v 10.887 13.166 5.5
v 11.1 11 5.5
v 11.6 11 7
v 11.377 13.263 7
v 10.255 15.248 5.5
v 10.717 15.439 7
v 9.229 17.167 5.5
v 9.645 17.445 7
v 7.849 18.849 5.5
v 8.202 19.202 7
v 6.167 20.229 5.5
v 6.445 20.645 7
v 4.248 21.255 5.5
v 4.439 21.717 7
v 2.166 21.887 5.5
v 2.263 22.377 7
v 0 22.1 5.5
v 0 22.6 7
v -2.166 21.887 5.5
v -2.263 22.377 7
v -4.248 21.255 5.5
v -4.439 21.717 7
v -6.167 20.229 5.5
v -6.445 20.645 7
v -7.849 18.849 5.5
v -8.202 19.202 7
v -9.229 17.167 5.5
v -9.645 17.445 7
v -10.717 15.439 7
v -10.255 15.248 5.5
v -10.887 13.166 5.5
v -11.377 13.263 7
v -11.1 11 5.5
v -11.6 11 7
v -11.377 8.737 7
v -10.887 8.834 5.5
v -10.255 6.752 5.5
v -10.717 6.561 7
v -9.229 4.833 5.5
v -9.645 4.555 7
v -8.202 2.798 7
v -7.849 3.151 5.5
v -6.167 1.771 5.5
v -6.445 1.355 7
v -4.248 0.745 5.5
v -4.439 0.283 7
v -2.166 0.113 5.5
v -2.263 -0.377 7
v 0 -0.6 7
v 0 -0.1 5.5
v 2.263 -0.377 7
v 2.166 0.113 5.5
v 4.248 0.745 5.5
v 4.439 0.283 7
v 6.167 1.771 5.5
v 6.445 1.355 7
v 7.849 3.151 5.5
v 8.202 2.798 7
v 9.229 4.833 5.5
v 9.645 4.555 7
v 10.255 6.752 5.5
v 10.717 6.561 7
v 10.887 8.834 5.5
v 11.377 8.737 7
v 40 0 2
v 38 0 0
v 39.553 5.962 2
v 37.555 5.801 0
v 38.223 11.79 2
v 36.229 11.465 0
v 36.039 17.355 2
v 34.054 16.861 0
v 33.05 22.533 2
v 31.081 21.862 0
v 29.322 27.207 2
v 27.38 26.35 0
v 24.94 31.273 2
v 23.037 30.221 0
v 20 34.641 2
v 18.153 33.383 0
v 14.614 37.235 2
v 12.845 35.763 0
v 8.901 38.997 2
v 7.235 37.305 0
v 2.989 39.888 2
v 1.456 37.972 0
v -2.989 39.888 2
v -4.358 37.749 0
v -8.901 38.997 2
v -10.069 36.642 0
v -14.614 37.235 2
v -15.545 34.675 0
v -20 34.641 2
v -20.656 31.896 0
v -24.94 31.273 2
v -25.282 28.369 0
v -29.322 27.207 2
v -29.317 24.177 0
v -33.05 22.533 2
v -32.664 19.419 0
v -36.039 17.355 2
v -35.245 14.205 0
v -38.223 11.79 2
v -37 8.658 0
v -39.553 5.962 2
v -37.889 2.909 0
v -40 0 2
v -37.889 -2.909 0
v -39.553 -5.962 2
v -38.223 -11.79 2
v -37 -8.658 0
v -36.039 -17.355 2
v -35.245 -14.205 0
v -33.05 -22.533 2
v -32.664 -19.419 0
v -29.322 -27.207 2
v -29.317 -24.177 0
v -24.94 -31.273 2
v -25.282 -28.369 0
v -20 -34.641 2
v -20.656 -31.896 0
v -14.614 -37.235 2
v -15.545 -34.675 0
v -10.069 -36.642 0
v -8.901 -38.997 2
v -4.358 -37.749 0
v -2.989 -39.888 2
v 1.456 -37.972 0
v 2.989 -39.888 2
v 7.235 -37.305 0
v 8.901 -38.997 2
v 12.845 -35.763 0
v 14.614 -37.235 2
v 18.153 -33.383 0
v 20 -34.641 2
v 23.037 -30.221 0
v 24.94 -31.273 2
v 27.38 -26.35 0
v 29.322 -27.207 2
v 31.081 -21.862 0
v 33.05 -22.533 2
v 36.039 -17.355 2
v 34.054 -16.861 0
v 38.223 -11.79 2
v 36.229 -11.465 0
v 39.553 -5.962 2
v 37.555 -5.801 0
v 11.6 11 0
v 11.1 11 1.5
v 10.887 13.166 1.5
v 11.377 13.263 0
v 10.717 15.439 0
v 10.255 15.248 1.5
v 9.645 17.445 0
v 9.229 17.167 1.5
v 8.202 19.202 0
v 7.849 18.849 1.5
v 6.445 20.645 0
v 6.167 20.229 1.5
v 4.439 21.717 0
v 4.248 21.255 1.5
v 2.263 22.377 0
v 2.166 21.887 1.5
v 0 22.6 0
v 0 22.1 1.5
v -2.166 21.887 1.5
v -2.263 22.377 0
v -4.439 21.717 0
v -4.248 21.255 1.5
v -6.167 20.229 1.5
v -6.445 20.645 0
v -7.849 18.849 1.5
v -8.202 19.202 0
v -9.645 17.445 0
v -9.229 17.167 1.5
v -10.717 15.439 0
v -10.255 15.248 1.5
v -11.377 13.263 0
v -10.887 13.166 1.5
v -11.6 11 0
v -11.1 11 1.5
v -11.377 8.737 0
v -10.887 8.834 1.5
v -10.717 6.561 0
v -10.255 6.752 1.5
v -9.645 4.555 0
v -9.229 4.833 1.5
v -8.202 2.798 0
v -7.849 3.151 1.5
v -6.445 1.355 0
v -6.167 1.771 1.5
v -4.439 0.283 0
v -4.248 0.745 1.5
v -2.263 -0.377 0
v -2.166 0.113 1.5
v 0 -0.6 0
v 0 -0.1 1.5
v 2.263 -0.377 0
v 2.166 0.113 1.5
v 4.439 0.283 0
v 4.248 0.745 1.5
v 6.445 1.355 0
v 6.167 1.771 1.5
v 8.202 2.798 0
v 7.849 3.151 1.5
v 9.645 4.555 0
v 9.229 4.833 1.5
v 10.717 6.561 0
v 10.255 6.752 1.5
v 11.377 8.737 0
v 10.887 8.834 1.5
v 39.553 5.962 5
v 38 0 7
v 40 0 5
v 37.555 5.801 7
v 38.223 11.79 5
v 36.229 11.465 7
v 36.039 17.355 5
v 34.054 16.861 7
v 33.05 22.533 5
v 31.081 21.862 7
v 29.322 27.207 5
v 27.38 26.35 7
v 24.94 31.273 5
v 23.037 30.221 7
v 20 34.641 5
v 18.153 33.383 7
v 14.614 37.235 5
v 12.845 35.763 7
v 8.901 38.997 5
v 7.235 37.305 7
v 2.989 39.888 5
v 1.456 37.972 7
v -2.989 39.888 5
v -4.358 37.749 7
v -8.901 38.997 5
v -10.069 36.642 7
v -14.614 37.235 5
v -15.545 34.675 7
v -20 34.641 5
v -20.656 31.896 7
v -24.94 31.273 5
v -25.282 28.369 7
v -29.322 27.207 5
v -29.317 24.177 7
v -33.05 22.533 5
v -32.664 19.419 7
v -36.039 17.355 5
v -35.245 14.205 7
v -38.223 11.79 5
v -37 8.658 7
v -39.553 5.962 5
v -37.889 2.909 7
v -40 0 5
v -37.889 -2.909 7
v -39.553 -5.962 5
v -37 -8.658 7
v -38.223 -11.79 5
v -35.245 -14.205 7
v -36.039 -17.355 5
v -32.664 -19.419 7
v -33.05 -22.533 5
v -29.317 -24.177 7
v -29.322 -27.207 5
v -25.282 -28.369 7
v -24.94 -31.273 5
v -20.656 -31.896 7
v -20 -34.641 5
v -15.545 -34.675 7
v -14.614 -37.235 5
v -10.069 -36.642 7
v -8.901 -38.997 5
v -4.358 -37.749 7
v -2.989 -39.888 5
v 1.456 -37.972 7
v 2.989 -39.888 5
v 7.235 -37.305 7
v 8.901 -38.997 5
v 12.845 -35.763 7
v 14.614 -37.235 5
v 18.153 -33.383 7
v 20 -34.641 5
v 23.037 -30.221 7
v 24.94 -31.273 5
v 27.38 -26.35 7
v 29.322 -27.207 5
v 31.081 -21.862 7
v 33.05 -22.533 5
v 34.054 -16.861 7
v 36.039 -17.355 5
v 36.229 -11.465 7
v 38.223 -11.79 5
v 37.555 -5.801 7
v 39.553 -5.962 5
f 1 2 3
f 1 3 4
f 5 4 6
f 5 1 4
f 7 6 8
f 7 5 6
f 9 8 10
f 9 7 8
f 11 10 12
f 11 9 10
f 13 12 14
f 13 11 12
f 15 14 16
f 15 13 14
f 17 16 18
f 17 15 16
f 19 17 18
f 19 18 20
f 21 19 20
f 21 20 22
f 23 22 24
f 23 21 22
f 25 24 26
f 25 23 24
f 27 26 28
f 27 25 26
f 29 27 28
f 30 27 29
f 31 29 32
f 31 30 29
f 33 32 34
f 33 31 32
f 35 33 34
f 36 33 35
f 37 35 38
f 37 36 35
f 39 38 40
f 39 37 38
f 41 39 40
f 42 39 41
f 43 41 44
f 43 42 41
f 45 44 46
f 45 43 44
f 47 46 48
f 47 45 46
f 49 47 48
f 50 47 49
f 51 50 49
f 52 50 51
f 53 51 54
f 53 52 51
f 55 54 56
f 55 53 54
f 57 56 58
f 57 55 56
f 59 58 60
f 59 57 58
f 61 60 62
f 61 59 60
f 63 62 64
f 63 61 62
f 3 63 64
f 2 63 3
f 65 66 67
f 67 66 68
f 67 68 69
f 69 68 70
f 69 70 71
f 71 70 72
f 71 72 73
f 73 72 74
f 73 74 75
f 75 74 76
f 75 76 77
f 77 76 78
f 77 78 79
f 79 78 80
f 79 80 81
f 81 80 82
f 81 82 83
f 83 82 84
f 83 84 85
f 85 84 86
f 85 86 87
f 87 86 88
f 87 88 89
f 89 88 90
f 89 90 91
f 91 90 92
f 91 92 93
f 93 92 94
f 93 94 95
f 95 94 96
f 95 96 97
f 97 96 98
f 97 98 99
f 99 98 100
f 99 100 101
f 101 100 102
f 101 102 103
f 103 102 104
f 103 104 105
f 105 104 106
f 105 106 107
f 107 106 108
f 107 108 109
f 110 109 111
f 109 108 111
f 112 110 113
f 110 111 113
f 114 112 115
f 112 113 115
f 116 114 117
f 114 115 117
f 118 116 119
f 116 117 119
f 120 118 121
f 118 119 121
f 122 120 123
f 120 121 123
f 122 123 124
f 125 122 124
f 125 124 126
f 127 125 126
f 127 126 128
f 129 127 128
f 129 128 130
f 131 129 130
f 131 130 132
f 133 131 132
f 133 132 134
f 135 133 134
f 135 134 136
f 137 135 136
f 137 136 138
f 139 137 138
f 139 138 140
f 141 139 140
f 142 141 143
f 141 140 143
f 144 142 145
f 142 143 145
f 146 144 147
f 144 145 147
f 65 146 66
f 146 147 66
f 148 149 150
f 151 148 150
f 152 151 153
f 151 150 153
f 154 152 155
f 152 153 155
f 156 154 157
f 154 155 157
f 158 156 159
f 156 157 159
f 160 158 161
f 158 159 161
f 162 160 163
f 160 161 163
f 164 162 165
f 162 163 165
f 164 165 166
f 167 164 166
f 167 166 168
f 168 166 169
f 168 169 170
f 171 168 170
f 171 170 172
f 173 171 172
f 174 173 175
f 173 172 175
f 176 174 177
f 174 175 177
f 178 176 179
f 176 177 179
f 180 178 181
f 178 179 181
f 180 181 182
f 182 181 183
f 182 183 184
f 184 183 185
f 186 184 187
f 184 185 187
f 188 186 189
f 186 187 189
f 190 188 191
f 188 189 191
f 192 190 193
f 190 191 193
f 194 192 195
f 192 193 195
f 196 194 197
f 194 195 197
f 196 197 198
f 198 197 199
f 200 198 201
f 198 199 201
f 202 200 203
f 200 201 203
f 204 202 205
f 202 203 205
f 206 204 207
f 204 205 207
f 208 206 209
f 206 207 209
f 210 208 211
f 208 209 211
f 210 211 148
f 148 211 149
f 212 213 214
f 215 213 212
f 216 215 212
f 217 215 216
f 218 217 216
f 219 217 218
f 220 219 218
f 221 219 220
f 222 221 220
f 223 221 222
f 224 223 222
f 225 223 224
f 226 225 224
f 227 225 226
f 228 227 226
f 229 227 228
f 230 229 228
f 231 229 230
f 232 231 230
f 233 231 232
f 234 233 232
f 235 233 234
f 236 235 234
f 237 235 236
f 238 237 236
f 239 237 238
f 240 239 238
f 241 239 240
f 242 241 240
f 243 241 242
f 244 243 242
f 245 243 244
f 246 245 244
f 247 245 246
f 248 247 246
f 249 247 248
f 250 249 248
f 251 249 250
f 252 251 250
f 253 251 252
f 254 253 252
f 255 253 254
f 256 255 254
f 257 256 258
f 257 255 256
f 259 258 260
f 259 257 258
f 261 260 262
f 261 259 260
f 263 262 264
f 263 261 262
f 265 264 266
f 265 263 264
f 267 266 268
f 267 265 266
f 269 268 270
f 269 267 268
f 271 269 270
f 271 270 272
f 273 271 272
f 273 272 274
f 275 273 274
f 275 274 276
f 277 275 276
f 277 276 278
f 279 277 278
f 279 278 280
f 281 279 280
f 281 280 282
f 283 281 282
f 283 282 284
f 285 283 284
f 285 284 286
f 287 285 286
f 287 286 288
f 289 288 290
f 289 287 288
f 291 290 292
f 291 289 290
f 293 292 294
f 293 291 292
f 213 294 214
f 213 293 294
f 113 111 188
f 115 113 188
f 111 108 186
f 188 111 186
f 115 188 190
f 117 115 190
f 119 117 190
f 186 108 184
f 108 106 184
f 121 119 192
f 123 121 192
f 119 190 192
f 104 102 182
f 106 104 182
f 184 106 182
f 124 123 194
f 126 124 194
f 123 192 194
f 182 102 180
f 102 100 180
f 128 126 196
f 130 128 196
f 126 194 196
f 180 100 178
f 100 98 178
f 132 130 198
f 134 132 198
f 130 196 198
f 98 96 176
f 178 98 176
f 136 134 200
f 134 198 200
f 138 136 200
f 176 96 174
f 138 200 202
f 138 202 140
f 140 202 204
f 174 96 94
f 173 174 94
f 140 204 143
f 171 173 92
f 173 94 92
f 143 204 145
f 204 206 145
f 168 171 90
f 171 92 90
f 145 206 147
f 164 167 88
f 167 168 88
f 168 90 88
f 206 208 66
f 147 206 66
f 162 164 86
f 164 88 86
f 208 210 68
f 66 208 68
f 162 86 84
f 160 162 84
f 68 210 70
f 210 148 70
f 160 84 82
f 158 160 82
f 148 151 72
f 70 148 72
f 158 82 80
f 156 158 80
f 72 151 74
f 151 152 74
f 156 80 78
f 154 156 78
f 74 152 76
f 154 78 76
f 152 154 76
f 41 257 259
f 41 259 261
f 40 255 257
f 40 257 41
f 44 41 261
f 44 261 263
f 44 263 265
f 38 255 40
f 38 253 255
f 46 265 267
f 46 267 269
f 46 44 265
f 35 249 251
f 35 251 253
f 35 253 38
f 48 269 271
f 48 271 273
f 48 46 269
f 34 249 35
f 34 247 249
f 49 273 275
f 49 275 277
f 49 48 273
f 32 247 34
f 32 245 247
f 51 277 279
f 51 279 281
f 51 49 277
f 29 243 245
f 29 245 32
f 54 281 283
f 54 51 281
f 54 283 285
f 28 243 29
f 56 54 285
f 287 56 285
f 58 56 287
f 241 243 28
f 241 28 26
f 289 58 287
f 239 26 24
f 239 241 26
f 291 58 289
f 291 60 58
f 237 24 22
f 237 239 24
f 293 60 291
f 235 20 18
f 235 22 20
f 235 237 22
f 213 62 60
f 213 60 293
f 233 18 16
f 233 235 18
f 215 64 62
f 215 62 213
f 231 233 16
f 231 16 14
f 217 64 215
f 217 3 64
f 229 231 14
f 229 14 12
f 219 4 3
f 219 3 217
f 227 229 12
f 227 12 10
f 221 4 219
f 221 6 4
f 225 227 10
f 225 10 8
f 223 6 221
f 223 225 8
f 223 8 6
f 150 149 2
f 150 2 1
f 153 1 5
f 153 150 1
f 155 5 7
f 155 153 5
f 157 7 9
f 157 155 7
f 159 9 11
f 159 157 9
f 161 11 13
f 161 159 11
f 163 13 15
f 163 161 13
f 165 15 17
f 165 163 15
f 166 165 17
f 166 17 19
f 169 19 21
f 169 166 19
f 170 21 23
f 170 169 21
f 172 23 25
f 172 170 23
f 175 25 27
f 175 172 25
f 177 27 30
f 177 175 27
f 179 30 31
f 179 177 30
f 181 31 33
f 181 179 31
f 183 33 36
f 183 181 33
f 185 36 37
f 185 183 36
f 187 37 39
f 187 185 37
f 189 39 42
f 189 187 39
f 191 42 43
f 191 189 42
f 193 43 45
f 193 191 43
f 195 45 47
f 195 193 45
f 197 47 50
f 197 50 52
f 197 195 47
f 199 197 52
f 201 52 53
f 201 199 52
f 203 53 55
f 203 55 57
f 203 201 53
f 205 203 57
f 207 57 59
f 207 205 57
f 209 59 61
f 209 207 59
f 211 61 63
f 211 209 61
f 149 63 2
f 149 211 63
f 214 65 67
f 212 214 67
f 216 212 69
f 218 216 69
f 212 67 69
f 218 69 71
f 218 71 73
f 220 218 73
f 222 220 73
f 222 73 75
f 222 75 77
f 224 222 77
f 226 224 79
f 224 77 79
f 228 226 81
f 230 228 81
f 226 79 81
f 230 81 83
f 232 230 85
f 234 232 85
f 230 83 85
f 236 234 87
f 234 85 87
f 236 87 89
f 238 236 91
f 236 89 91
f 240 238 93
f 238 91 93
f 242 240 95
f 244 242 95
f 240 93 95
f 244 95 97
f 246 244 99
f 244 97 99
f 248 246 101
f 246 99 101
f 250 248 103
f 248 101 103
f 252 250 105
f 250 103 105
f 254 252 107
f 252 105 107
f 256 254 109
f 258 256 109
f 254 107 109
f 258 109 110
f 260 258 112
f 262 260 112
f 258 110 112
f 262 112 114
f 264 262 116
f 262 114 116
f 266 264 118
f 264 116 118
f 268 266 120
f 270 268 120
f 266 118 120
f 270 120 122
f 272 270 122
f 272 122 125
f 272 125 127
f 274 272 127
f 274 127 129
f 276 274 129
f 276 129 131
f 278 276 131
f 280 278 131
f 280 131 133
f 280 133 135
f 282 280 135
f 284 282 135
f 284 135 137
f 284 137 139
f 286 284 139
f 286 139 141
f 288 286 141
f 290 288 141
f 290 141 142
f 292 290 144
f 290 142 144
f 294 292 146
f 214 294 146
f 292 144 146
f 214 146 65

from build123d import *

# Parameters (mm, degrees)
F0_R     = 40
F0_R_2   = 11.1
F1_DEPTH = 7
F2_SIZE  = 2
F3_SIZE2 = 1.5
F3_SIZE  = 0.5


with BuildPart() as f1:
    # F0 (on Top) → F1 (new body)
    with BuildSketch(Plane.XY):
        Circle(F0_R)
        with Locations((0, 11)):
            Circle(F0_R_2, mode=Mode.SUBTRACT)
    extrude(amount=F1_DEPTH)

    # F2
    f2_edges = [f1.edges().sort_by_distance(p)[0] for p in [
        (-40, 0, 7),
        (-40, 0, 0),
    ]]
    chamfer(f2_edges, length=F2_SIZE)

    # F3
    f3_edges = [f1.edges().sort_by_distance(p)[0] for p in [
        (-11.1, 11, 0),
        (-11.1, 11, 7),
    ]]
    chamfer(f3_edges, length=F3_SIZE, length2=F3_SIZE2)


solid = f1.part
